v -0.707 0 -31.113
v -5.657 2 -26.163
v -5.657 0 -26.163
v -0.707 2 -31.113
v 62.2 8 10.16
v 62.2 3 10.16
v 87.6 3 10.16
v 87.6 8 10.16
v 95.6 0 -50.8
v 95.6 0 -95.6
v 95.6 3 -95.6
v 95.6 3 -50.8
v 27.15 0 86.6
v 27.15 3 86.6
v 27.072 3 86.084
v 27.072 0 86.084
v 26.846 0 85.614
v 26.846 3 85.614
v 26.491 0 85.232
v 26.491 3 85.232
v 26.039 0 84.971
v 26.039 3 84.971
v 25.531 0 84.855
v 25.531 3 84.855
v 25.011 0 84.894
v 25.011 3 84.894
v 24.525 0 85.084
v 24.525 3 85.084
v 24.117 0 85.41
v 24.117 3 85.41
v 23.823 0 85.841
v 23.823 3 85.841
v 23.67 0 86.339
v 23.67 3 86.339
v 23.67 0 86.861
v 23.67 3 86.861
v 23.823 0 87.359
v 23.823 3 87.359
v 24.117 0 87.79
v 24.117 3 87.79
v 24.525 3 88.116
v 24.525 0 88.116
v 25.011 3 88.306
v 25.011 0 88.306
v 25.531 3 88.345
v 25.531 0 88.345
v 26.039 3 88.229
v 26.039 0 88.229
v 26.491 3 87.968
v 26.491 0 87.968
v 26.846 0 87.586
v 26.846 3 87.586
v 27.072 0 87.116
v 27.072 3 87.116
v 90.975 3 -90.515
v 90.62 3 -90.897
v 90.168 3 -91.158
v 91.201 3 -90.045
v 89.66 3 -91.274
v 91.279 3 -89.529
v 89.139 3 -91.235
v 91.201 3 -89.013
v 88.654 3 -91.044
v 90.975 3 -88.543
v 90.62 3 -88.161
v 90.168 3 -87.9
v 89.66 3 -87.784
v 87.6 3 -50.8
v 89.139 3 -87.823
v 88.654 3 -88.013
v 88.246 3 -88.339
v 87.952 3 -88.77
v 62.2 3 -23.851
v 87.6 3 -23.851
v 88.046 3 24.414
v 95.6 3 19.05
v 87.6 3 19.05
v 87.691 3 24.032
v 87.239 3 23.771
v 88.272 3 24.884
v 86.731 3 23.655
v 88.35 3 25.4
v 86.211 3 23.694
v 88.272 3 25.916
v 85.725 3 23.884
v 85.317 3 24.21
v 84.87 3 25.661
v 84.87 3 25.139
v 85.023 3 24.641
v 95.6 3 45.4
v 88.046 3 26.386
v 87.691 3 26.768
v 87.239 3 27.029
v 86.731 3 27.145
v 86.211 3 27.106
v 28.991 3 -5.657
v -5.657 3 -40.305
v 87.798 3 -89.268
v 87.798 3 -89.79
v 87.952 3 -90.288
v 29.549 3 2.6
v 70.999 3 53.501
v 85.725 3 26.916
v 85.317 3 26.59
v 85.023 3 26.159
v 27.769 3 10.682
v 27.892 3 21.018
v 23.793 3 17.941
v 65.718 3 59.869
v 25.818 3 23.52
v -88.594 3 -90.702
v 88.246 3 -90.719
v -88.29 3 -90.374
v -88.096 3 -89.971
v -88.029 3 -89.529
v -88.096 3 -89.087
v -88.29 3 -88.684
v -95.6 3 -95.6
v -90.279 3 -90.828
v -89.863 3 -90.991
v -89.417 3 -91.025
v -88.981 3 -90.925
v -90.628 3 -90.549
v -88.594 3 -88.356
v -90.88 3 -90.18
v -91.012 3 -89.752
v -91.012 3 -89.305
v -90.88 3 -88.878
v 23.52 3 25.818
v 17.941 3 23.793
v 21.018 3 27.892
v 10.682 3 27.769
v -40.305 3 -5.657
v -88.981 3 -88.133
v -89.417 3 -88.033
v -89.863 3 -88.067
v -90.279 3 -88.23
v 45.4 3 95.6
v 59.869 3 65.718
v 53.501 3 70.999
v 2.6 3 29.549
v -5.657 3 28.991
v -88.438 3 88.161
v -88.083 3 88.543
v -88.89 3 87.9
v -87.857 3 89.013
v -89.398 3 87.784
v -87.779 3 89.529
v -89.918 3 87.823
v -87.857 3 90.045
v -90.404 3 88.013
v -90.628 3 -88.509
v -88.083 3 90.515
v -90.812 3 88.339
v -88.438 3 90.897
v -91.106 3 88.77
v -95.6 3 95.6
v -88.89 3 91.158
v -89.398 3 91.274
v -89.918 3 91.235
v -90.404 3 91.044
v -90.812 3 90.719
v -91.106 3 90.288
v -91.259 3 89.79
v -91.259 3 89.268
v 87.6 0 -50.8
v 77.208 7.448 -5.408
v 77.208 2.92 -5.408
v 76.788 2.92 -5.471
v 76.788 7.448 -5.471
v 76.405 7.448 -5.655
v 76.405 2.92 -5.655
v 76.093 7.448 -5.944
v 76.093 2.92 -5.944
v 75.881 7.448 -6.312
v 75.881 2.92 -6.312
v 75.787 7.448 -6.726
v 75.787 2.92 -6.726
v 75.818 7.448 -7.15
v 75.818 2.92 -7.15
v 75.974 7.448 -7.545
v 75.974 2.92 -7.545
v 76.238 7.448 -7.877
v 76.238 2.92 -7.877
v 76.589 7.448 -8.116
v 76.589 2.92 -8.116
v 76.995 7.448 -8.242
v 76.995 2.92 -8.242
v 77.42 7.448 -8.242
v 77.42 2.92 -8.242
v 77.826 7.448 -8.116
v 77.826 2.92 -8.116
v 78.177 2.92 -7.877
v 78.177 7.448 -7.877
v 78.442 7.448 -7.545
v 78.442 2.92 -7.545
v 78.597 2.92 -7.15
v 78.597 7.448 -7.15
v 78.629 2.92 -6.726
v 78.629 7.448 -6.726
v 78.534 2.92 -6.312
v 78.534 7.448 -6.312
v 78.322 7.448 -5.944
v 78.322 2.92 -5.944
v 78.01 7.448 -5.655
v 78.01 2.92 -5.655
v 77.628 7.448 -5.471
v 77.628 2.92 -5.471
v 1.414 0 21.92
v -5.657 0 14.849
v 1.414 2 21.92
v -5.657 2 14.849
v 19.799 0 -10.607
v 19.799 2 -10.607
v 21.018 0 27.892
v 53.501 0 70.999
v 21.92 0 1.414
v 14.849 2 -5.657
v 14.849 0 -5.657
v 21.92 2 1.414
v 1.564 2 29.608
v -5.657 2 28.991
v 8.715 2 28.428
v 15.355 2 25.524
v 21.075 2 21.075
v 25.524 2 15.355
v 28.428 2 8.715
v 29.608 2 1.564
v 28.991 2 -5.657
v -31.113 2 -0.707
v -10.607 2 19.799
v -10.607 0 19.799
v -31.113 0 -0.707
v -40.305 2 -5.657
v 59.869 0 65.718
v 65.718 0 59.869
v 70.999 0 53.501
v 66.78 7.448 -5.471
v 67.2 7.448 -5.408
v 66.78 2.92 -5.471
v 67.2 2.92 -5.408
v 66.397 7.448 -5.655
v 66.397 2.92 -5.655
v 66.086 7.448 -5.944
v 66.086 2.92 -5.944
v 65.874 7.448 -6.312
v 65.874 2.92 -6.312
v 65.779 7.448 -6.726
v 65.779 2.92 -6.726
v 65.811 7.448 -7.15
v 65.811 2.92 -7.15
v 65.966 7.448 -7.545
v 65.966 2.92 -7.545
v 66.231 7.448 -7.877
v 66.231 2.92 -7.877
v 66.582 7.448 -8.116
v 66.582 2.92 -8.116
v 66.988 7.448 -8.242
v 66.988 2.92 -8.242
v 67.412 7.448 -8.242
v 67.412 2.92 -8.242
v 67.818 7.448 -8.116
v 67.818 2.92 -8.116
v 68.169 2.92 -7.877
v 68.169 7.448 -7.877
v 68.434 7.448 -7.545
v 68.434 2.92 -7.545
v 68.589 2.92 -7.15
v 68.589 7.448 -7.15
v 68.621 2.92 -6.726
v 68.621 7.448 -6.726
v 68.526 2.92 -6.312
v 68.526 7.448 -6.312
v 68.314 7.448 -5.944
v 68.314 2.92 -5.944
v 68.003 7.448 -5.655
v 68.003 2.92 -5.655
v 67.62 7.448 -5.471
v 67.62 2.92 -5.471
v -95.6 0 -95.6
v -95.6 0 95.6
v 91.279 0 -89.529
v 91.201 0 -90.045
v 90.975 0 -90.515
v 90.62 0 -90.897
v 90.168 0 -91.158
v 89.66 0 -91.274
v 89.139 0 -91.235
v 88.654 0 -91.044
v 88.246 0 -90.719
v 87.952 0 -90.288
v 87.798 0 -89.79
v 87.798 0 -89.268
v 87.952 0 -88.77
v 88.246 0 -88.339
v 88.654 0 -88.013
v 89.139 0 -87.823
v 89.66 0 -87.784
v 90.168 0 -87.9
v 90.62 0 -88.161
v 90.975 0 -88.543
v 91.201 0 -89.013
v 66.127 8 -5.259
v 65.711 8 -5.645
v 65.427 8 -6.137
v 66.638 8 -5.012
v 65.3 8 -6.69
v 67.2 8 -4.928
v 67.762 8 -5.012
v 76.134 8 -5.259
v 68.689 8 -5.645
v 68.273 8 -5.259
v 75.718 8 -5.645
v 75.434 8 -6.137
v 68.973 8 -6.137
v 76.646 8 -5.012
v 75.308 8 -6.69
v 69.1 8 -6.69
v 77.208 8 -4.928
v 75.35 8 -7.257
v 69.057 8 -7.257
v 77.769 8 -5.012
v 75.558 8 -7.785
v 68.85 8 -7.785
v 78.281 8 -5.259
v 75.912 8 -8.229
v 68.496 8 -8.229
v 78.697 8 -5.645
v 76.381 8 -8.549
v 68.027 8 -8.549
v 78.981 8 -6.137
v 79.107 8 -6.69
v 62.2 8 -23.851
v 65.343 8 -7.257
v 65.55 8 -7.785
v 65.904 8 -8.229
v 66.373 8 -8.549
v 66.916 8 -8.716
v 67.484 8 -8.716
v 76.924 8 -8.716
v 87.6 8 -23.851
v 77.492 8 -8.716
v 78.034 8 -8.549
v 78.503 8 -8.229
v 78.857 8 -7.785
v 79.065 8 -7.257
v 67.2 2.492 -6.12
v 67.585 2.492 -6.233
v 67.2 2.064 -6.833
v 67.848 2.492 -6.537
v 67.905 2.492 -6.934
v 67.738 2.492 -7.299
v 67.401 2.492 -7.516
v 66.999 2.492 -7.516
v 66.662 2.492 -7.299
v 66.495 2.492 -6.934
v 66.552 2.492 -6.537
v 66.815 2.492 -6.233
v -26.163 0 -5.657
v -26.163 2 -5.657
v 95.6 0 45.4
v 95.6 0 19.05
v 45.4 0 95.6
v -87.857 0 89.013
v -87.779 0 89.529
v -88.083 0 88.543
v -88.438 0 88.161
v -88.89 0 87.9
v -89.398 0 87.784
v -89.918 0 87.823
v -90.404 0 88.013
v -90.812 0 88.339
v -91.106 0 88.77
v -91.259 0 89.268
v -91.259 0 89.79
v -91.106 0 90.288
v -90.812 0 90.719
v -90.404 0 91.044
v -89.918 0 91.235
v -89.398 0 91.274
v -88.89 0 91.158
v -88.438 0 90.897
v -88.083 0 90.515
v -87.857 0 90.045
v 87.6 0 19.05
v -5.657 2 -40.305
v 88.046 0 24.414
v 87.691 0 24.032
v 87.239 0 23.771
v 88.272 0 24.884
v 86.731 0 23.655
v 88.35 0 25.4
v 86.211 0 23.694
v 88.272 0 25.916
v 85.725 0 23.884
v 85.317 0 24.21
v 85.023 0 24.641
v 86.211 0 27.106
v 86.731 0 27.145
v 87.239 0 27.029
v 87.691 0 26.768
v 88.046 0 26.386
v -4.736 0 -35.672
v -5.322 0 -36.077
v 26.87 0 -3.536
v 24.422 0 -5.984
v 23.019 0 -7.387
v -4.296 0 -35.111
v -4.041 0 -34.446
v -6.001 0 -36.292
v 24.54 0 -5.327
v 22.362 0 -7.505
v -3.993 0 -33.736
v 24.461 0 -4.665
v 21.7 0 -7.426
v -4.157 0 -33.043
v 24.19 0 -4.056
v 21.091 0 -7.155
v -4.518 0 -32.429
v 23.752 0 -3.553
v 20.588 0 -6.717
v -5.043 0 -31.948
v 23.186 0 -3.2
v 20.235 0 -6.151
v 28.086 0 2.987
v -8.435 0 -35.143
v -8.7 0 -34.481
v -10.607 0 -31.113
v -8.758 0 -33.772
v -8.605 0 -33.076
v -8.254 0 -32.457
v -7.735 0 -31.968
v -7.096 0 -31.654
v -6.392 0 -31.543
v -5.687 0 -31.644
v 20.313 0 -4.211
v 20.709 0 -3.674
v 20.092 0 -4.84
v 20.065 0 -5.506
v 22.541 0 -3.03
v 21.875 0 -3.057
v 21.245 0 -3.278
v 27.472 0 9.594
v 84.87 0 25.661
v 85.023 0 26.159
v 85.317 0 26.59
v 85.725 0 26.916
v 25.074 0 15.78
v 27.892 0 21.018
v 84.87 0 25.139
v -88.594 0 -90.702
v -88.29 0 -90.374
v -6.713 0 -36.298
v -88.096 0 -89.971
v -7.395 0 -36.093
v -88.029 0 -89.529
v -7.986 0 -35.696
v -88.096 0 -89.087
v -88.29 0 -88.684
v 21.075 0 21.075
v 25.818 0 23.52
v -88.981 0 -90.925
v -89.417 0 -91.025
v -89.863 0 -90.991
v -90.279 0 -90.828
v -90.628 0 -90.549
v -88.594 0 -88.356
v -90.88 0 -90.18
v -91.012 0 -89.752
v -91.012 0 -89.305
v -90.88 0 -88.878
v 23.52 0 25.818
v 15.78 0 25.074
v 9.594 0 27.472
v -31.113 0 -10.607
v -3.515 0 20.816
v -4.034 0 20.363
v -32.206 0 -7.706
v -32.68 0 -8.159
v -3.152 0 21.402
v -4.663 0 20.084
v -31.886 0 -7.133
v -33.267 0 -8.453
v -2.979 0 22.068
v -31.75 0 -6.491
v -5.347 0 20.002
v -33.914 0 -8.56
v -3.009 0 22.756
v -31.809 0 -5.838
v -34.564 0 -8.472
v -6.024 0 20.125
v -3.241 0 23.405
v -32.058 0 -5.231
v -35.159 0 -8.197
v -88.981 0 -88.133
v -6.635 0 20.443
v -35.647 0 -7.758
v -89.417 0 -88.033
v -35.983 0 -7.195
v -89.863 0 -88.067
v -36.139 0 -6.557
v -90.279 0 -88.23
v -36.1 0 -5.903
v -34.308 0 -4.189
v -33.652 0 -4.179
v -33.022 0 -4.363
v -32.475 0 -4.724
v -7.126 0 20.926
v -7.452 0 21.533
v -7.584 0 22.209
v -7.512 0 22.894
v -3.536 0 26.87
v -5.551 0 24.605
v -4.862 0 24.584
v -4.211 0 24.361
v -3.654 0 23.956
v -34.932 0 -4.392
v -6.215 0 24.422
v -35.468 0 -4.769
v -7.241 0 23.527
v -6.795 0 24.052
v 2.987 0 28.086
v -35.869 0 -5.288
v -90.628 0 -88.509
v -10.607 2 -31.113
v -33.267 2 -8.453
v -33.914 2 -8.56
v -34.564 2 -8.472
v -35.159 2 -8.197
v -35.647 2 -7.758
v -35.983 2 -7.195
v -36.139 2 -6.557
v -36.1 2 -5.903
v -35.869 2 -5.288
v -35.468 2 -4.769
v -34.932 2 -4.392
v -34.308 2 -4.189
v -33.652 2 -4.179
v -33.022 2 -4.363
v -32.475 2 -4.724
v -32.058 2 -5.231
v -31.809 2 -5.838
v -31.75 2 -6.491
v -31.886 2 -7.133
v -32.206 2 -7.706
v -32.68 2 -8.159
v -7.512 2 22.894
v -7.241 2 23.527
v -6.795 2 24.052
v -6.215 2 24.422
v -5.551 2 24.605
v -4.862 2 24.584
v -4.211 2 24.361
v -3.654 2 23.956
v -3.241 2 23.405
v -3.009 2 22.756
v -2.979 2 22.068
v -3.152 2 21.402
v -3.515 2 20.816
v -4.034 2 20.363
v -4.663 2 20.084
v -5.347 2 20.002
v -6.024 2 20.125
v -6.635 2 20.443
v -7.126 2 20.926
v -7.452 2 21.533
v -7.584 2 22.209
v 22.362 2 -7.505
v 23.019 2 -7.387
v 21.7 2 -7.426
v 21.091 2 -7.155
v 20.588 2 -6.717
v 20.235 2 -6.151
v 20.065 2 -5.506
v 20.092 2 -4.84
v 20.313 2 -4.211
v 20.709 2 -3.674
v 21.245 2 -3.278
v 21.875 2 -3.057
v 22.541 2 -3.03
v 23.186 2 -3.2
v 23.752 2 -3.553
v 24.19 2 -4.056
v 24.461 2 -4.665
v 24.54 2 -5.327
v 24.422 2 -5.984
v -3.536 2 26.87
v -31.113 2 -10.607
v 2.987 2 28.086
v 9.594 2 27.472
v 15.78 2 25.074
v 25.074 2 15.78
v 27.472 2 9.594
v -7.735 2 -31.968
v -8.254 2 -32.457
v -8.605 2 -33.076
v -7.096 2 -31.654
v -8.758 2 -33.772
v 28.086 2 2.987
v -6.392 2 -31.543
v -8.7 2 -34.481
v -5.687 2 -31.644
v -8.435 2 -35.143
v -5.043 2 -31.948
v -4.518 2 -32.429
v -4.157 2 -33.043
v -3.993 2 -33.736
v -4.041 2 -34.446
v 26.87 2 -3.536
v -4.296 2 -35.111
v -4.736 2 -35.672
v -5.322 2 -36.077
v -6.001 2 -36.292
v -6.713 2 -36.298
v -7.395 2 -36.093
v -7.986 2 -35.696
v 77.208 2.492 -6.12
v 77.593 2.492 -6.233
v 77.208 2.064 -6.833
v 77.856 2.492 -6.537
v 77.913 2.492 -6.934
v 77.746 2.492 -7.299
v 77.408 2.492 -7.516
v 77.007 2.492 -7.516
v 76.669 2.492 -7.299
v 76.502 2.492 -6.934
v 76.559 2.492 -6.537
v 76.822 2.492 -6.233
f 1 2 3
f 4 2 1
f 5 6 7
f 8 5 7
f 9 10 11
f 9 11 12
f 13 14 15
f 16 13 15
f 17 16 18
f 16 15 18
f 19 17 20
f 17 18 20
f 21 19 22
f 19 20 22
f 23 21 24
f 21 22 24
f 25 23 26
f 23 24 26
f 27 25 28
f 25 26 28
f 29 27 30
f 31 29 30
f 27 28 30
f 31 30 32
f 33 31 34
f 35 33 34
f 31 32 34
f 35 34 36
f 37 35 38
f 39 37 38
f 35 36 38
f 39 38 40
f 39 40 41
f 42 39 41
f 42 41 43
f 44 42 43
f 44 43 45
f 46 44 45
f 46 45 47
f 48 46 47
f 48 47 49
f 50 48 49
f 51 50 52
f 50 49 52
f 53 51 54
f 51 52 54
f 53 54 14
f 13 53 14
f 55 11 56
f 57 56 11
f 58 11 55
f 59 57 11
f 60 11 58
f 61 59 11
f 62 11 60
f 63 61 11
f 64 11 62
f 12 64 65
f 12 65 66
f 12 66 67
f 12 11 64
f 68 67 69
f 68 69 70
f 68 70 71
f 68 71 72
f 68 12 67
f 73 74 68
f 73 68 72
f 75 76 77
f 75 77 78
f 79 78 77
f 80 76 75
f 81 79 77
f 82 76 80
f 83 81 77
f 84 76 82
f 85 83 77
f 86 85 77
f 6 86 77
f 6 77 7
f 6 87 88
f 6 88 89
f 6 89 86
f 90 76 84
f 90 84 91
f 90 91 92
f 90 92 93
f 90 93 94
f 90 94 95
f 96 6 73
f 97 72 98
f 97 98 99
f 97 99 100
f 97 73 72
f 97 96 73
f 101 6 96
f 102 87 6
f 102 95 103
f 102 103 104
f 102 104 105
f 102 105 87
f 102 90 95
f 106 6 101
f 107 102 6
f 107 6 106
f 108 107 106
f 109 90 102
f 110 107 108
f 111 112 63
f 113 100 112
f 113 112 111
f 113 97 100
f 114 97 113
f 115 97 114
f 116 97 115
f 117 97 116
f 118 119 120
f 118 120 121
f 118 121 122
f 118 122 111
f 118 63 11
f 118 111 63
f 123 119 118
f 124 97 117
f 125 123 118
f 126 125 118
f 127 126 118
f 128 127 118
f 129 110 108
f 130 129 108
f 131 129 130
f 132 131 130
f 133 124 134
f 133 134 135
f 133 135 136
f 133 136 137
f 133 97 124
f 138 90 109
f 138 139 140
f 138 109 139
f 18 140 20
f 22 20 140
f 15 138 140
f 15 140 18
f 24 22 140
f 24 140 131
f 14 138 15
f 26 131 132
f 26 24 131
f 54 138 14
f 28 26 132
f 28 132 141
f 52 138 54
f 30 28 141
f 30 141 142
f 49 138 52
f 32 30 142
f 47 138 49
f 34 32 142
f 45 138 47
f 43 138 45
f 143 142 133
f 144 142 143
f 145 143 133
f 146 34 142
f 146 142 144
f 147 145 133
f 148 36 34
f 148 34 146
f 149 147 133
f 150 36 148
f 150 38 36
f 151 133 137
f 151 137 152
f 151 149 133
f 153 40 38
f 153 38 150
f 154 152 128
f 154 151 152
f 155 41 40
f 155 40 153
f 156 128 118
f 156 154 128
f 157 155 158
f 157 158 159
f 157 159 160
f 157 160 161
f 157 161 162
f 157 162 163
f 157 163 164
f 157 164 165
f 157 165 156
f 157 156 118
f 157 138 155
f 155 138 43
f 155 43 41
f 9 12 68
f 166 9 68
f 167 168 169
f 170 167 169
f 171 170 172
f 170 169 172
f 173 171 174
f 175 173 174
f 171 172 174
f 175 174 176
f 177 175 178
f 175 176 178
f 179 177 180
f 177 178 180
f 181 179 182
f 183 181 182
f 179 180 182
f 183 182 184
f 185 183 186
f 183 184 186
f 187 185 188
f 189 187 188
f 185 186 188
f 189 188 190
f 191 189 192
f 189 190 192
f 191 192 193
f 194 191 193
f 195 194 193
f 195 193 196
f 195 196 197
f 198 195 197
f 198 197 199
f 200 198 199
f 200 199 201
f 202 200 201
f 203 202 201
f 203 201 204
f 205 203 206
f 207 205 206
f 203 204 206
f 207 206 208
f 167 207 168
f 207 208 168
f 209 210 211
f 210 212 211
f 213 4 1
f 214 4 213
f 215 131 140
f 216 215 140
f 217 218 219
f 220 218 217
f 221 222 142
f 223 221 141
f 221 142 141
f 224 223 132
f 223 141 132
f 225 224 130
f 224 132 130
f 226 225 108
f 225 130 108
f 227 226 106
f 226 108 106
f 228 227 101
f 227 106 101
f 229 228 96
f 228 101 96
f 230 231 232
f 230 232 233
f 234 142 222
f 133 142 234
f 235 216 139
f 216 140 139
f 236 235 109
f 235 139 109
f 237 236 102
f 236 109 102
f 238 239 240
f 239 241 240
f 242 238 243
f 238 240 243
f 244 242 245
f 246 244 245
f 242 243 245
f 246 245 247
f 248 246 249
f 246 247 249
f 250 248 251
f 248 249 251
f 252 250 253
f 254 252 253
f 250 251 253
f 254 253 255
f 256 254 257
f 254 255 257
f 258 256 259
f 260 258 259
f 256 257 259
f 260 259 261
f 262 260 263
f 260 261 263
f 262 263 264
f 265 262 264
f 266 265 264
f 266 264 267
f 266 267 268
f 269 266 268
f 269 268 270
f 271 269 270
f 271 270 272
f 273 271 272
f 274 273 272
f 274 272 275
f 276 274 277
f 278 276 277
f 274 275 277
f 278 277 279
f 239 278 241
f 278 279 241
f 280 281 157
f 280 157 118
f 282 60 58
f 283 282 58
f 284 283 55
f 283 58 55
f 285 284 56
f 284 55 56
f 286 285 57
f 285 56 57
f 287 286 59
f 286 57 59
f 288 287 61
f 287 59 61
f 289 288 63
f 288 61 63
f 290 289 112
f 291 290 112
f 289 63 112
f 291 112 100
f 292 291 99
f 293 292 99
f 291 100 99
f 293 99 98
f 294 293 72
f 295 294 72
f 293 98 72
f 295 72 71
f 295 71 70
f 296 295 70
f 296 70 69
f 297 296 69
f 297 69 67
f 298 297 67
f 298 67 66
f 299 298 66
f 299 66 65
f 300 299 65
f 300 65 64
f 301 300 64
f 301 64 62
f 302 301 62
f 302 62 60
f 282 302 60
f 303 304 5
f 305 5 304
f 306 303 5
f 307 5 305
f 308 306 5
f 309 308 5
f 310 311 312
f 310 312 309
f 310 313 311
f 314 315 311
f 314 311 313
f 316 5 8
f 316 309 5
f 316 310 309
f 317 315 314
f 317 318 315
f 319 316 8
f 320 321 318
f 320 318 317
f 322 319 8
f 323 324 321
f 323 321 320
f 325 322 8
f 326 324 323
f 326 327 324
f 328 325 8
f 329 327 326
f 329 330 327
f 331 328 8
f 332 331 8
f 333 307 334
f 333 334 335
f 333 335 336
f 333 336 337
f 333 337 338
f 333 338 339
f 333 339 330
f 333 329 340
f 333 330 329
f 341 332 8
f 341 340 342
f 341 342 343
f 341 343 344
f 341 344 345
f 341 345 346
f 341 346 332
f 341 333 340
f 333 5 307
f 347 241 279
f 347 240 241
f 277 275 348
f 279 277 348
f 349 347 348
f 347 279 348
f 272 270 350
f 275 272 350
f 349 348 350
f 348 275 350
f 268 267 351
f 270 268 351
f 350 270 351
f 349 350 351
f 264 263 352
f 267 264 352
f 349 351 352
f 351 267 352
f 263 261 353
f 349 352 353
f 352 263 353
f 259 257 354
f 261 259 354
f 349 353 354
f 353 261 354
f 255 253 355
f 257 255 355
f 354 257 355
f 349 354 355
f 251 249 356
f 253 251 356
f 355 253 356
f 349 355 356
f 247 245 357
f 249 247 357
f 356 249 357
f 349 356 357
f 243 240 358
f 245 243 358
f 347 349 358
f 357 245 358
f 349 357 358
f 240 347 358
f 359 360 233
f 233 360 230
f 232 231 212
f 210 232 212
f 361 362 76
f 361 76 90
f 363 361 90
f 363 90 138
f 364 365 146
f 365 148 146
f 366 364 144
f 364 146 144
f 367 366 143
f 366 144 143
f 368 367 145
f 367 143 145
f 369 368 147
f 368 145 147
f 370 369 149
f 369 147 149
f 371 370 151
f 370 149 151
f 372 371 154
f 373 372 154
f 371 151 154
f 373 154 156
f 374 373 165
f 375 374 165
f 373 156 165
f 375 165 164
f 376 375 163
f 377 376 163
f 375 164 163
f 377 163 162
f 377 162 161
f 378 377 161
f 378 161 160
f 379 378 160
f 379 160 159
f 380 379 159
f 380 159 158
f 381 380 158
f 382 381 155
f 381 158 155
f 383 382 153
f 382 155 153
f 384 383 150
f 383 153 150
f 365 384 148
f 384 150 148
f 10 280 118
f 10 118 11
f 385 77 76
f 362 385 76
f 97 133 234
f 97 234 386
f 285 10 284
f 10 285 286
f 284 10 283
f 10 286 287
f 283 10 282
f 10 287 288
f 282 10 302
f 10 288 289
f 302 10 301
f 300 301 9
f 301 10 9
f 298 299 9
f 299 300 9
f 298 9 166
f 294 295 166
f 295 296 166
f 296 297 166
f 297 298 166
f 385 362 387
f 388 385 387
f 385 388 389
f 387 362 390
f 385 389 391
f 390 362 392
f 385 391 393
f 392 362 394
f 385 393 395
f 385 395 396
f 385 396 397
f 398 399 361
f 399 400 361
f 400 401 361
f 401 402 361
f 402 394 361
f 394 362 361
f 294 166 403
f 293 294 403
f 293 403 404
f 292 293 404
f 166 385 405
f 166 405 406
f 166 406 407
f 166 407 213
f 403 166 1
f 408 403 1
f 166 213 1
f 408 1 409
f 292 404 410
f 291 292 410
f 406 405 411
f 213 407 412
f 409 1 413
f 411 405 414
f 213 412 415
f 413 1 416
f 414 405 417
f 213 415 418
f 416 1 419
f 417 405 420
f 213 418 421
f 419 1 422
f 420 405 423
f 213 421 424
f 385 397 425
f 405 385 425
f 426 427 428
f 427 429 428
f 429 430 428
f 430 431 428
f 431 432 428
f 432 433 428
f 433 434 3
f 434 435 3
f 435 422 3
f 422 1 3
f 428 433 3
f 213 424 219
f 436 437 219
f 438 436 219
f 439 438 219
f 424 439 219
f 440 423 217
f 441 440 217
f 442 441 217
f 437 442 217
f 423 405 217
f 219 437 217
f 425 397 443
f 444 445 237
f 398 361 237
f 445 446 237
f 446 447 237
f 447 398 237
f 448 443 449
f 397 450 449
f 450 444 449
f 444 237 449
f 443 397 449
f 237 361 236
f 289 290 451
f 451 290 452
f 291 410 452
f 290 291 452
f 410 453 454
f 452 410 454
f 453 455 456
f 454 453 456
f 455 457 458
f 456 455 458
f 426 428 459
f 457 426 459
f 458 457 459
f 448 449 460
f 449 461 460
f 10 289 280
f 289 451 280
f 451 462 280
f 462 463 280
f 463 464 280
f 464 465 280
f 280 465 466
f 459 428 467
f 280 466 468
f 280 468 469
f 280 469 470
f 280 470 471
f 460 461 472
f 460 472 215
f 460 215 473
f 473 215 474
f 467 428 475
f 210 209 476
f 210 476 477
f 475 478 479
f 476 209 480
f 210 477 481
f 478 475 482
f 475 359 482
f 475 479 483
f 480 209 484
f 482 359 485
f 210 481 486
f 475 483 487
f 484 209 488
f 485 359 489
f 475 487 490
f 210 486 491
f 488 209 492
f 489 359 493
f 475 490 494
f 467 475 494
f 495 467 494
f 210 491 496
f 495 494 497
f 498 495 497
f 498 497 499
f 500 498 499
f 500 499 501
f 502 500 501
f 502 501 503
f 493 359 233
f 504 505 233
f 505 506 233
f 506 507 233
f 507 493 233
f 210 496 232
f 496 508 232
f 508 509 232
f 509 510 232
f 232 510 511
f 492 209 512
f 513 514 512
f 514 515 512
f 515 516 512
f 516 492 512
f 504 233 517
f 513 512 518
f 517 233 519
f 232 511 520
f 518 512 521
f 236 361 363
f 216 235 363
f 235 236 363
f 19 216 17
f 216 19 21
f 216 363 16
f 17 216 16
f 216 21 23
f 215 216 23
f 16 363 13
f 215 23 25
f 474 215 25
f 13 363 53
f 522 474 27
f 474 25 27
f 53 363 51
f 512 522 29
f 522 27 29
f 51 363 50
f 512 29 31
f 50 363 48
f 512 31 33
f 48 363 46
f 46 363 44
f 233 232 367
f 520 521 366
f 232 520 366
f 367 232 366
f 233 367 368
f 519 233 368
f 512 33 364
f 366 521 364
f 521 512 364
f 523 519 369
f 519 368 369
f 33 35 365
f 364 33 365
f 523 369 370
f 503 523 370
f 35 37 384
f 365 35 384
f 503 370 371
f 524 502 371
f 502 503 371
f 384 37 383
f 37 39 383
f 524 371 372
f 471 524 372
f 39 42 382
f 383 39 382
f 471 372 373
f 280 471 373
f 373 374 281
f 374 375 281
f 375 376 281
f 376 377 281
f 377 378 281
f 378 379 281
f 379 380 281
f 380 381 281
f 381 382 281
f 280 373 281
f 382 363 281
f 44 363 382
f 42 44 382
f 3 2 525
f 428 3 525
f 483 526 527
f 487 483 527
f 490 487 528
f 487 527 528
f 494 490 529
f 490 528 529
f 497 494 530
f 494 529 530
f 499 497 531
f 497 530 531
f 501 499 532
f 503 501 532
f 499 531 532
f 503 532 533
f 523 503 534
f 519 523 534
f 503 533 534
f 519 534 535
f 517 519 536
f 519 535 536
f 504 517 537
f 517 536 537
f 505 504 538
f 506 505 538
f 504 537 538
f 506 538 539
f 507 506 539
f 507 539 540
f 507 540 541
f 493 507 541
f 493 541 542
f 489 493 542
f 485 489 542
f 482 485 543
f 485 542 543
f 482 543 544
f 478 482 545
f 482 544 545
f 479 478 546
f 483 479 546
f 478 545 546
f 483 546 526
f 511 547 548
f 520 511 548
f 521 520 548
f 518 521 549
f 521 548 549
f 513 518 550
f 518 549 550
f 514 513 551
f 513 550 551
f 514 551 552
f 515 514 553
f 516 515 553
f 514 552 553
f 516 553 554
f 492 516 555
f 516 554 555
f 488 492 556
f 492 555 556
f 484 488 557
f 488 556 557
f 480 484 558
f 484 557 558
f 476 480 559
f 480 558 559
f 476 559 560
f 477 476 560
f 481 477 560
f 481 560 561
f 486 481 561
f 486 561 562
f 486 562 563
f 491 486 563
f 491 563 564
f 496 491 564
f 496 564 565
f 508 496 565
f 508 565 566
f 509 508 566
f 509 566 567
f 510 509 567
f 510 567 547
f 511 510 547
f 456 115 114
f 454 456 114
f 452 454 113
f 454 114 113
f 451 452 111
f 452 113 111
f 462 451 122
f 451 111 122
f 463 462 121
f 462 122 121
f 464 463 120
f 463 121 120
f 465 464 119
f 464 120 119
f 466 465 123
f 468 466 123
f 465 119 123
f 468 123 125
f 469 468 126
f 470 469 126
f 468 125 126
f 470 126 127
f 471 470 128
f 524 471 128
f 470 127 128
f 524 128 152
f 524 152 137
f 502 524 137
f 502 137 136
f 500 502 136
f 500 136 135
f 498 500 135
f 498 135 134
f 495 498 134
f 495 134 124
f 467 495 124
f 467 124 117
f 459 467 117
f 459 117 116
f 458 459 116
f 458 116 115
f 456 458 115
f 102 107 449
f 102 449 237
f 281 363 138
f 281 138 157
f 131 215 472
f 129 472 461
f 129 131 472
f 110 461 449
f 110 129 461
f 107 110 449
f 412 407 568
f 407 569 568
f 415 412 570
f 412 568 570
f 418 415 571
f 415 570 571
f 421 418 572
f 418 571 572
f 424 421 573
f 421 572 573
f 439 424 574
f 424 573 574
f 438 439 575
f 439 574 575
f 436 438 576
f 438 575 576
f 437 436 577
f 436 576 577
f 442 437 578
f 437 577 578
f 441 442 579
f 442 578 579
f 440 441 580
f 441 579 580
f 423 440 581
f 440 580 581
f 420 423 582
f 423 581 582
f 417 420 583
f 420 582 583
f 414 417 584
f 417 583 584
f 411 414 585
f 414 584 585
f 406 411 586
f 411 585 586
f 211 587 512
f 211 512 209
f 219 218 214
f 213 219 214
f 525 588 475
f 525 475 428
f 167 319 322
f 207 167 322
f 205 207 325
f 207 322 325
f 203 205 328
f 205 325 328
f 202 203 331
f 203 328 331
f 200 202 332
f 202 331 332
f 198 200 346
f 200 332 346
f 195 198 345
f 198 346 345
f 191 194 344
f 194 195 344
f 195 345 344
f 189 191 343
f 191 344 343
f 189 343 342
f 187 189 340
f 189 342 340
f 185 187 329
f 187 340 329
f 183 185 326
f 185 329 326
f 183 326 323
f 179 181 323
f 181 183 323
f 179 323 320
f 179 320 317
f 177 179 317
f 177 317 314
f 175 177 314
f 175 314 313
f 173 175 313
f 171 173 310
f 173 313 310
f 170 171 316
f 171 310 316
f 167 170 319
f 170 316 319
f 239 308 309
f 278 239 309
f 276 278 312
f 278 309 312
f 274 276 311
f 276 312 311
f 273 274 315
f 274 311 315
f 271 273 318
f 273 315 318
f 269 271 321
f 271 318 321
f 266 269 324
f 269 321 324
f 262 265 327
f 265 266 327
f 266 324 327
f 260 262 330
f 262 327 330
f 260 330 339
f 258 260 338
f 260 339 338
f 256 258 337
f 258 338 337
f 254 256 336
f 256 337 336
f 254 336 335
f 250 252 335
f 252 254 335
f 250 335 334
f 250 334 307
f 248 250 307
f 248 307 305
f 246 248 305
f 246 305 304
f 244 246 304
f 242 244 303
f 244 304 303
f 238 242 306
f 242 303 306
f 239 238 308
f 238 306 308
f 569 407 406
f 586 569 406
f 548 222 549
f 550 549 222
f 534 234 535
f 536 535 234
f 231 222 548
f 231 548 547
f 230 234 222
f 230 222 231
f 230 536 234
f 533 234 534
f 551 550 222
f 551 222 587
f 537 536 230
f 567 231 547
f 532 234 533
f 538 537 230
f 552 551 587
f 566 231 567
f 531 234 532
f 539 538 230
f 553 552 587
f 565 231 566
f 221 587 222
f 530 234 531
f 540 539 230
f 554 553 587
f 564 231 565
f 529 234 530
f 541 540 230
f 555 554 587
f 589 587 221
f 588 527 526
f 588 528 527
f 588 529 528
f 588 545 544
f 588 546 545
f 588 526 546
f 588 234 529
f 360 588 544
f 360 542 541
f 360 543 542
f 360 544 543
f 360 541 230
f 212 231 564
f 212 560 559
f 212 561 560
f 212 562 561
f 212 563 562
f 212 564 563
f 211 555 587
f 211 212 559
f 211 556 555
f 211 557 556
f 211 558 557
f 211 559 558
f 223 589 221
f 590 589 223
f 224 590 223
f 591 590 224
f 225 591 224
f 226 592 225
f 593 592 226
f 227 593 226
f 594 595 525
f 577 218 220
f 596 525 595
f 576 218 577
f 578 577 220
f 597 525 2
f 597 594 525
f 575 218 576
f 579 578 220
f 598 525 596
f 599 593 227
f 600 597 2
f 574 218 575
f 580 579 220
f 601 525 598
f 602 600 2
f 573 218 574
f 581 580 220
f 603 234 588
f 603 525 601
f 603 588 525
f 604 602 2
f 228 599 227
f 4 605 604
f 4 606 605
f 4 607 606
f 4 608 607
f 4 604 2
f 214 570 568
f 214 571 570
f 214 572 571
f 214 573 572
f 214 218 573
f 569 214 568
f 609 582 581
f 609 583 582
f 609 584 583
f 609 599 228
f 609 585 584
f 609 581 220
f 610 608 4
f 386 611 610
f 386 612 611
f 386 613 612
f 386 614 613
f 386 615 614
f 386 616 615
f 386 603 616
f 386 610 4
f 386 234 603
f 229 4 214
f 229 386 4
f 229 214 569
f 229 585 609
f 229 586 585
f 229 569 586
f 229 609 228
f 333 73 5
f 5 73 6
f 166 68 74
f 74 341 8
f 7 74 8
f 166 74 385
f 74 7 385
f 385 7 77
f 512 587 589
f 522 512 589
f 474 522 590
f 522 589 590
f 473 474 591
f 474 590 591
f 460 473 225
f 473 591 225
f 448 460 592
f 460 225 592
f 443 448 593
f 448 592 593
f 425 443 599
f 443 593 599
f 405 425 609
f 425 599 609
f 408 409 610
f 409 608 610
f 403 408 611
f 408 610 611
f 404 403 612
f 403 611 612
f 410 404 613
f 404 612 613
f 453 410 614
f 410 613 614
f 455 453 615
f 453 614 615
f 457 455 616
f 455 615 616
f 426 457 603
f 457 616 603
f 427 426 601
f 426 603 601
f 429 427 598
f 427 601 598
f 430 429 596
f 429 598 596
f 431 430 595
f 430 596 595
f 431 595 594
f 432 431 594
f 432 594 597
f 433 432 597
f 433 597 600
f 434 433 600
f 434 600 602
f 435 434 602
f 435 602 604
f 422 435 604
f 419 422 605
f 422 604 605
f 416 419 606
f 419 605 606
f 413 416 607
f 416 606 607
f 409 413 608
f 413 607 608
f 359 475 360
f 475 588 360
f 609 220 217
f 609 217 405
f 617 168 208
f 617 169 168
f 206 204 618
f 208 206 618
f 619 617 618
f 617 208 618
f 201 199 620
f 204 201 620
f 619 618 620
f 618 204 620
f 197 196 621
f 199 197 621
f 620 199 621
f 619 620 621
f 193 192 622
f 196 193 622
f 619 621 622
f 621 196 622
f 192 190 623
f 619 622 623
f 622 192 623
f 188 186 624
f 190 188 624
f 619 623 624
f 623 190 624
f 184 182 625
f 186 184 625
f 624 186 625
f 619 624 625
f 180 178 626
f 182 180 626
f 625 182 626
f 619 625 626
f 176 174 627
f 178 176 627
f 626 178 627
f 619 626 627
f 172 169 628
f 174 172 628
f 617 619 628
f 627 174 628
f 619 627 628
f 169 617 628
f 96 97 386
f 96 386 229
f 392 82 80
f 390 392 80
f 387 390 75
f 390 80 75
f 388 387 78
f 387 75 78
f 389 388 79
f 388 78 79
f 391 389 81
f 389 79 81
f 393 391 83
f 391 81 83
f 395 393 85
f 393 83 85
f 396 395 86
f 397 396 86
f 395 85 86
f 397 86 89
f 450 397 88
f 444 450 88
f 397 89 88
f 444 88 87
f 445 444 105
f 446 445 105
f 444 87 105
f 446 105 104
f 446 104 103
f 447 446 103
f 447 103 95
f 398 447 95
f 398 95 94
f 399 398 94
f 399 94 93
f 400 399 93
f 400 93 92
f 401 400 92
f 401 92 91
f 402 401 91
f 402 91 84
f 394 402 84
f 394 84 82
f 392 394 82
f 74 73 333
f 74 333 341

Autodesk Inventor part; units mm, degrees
ref_plane "YZ Plane" through (0, 0, 0) normal (1, 0, 0) x (0, 1, 0)
ref_plane "XZ Plane" through (0, 0, 0) normal (0, 1, 0) x (-1, 0, 0)
sketch "Sketch1" plane through (0, 0, 0) normal (0, 1, 0) x (-1, 0, 0)
  line L0 (101.6, -101.6) -> (-101.6, -101.6)
  line L1 (-101.6, -101.6) -> (-101.6, 101.6)
  line L2 (-101.6, 101.6) -> (101.6, 101.6)
  line L3 (101.6, 101.6) -> (101.6, -101.6)
  line L4 (96.6, -96.6) -> (-96.6, -96.6)
  line L5 (-96.6, -96.6) -> (-96.6, 96.6)
  line L6 (-96.6, 96.6) -> (96.6, 96.6)
  line L7 (96.6, 96.6) -> (96.6, -96.6)
  line L8 (101.6, 101.6) -> (-40.4, 101.6)
  circle A0 centre (0, 0) radius 88.9
  line L9 (-40.4, 101.6) -> (-101.6, 40.4)
  line L10 (-45.4, 101.6) -> (-101.6, 45.4)
  line L11 (96.6, 96.6) -> (96.6, 101.6)
  line L12 (-45.4, 101.6) -> (-35.4, 101.6)
  line L13 (-35.4, 101.6) -> (-35.4, 96.6)
  line L14 (-35.4, 96.6) -> (-45.4, 96.6)
  line L15 (-45.4, 96.6) -> (-45.4, 101.6)
  line L16 (-101.6, 39.4) -> (-39.4, 101.6)
  line L17 (95.6, -95.6) -> (-95.6, -95.6)
  line L18 (-95.6, -95.6) -> (-95.6, 95.6)
  line L19 (-95.6, 95.6) -> (95.6, 95.6)
  line L20 (95.6, 95.6) -> (95.6, -95.6)
  point P0 (96.6, 51.2168)
  point P1 (101.6, 40.4)
  point P2 (101.6, -40.4)
  point P3 (96.6, -51.2168)
  point P4 (-96.6, 45.4)
  point P5 (-45.4, 96.6)
  point P6 (-45.4, 95.6)
  point P7 (-95.6, 45.4)
  dimension "d0" = 203.2
  dimension "d1" = 203.2
  dimension "d2" = 101.6
  dimension "d3" = 101.6
  dimension "d4" = 5
  dimension "d5" = 5
  dimension "d6" = 5
  dimension "d7" = 5
  dimension "d8" = 142
  dimension "d9" = 61.2
  dimension "d10" = 177.8
  dimension "d11" = 5
  dimension "d12" = 5
  dimension "d13" = 10
  dimension "d14" = 1
  dimension "d15" = 1
  dimension "d16" = 1
  dimension "d17" = 1
  dimension "d18" = 1
extrude "Extrusion1" add sketch "Sketch1" along normal blind 3 contours L16 L19 L20 L17 L18 | A0
sketch "Sketch2" plane through (0, 3, 0) normal (0, 1, 0) x (1, 0, 0)
  circle A0 centre (0, 0) radius 34.925
  circle A1 centre (0, 0) radius 88.9
  line L0 (0, 0) -> (53.5014, -70.9987)
  line L1 (0, 0) -> (70.9987, -53.5014)
  line L2 (45.4, -95.6) -> (95.6, -45.4) projected
  line L3 (70.5, -70.5) -> (0, 0)
  point P0 (21.0184, -27.8923)
  point P1 (27.8923, -21.0184)
  dimension "d21" = 69.85
  dimension "d22" = 177.8
  dimension "d23" = 8
  dimension "d24" = 8
extrude "Extrusion2" cut sketch "Sketch2" against normal blind 5 contours A0 L3 A1 L0 | L1 A1 L3 A0
sketch "Sketch3" plane through (0, 3, 0) normal (0, 1, 0) x (1, 0, 0)
  circle A0 centre (0, 0) radius 2.5
  line L0 (11.3314, 2.139) -> (-2.139, -11.3314)
  line L1 (0, 0) -> (-5.6569, 5.6569)
  line L2 (-5.6569, -14.8492) -> (-26.163, 5.6569)
  line L3 (-5.6569, 26.163) -> (14.8492, 5.6569)
  circle A1 centre (-5.6569, 5.6569) radius 14
  line L4 (-26.163, 5.6569) -> (-5.6569, 26.163)
  line L5 (14.8492, 5.6569) -> (-5.6569, -14.8492)
  line L6 (-40.3051, 5.6569) -> (-5.6569, 40.3051)
  line L7 (-5.6569, 40.3051) -> (28.9914, 5.6569)
  line L8 (28.9914, 5.6569) -> (-5.6569, -28.9914)
  line L9 (-5.6569, -28.9914) -> (-40.3051, 5.6569)
  line L10 (-22.6451, 9.1747) -> (-9.1747, 22.6451)
  line L11 (-9.1747, 22.6451) -> (-12.7668, 26.2372)
  line L12 (-12.7668, 26.2372) -> (-26.2372, 12.7668)
  line L13 (-26.2372, 12.7668) -> (-22.6451, 9.1747)
  line L14 (-36.0624, 5.6569) -> (-5.6569, 36.0624)
  line L15 (-5.6569, 36.0624) -> (26.8701, 3.5355)
  line L16 (26.8701, 3.5355) -> (-3.5355, -26.8701)
  line L17 (-3.5355, -26.8701) -> (-36.0624, 5.6569)
  arc A2 (-5.6569, -28.9914) -> (28.9914, 5.6569) centre (0.4206, -0.4206) ccw
  dimension "d27" = 8
  dimension "d28" = 28
  dimension "d29" = 29
  dimension "d30" = 29
  dimension "d31" = 14.5
  dimension "d32" = 10
  dimension "d33" = 10
  dimension "d34" = 10
  dimension "d35" = 10
  dimension "d36" = 5.08
  dimension "d37" = 9.525
  dimension "d38" = 9.525
  dimension "d39" = 3
  dimension "d40" = 3
  dimension "d41" = 0
  dimension "d42" = 3
  dimension "d51" = 29.21
extrude "Extrusion3" cut sketch "Sketch3" against normal blind 1 contours A0 | L0 L5 L2 L4 L3 | L4 L13 L12 L11 | A1 | L6 L7 L8 L15 L14 L17 L9 | L8 A2 | L17 L14 L15 L8
sketch "Sketch4" plane through (0, 2, 0) normal (0, 1, 0) x (1, 0, 0)
  line L0 (-36.0624, 5.6569) -> (-5.6569, 36.0624)
  line L1 (-5.6569, 36.0624) -> (26.8701, 3.5355)
  line L2 (26.8701, 3.5355) -> (-3.5355, -26.8701)
  line L3 (-3.5355, -26.8701) -> (-36.0624, 5.6569)
  line L4 (-5.6569, 40.3051) -> (28.9914, 5.6569) projected
  line L5 (-40.3051, 5.6569) -> (-5.6569, 40.3051) projected
  line L6 (-5.6569, -28.9914) -> (-40.3051, 5.6569) projected
  line L7 (28.9914, 5.6569) -> (-5.6569, -28.9914) projected
  arc A0 (-3.5355, -26.8701) -> (26.8701, 3.5355) centre (4.0877, -4.0877) ccw
  point P0 (0, 0)
  dimension "d45" = 3
  dimension "d46" = 3
  dimension "d47" = 3
  dimension "d48" = 0
extrude "Extrusion4" cut sketch "Sketch4" against normal blind 5 contours L0 L1 L2 L3 | L2 A0
sketch "Sketch6" plane through (0, 3, 0) normal (0, 1, 0) x (1, 0, 0)
  line L0 (95.6, 95.6) -> (-95.6, 95.6) projected
  line L1 (95.6, 95.6) -> (87.6, 95.6)
  line L2 (87.6, 95.6) -> (87.6, -46.4)
  line L3 (87.6, -46.4) -> (95.6, -46.4)
  line L4 (95.6, -46.4) -> (95.6, 95.6)
  line L5 (95.6, -45.4) -> (95.6, 95.6) projected
  line L6 (87.6, -19.05) -> (95.6, -19.05)
  line L7 (95.6, -19.05) -> (95.6, 50.8)
  line L8 (95.6, 50.8) -> (87.6, 50.8)
  line L9 (87.6, 50.8) -> (87.6, -19.05)
  line L10 (0, 0) -> (95.6, 0)
  point P0 (95.6, -19.05)
  dimension "d58" = 8
  dimension "d59" = 142
  dimension "d62" = 50.8
  dimension "d63" = 19.05
extrude "Extrusion6" cut sketch "Sketch6" against normal blind 25.4 contours L4 L10 L2 L8 | L4 L6 L2 L10
sketch "Sketch7" plane through (0, 3, 0) normal (0, 1, 0) x (1, 0, 0)
  line L0 (-95.6, 95.6) -> (-95.6, -95.6) projected
  line L1 (-95.6, -95.6) -> (45.4, -95.6) projected
  line L2 (95.6, 50.8) -> (87.6, 50.8) projected
  line L3 (87.6, 50.8) -> (62.2, 50.8)
  line L4 (87.6, -19.05) -> (87.6, 50.8)
  line L5 (87.6, -19.05) -> (87.6, 50.8) projected
  line L6 (87.6, 50.8) -> (95.6, 50.8) projected
  line L7 (87.6, 50.8) -> (62.2, 50.8)
  line L8 (62.2, 50.8) -> (62.2, -10.16)
  line L9 (62.2, -10.16) -> (87.6, -10.16)
  line L10 (87.6, -10.16) -> (87.6, 50.8)
  line L11 (62.2, 23.8506) -> (87.6, 23.8506)
  point P0 (0, 0)
  dimension "d72" = 60.96
  dimension "d90" = 34.0106
extrude "Extrusion7" add sketch "Sketch7" along normal blind 5 contours L4 L9 L8 L11
sketch "Sketch8" plane through (0, 8, 0) normal (0, 1, 0) x (1, 0, 0)
  line L0 (62.2, -10.16) -> (87.6, -10.16) projected
  line L1 (62.2, -10.16) -> (87.6, -10.16)
  line L2 (87.6, -10.16) -> (87.6, 6.8326)
  line L3 (87.6, 50.8) -> (87.6, -19.05) projected
  line L4 (87.6, 6.8326) -> (62.2, 6.8326)
  circle A0 centre (77.2076, 6.8326) radius 1.5
  circle A1 centre (67.2, 6.8326) radius 1.5
  line L5 (62.2, 23.8506) -> (62.2, -10.16) projected
  point P0 (0, 0)
  dimension "d78" = 16.9926
  dimension "d79" = 3
  dimension "d80" = 3
  dimension "d139" = 5
  dimension "d140" = 10.0076
hole "Hole1" at (77.2076, 8, -6.8326) at (67.2, 8, -6.8326) direction (0, -1, 0) diameter 2.85 depth 5.08 tip angle 118 countersink diameter 3.81 countersink angle 82 thread size "M3.5x0.6" class "6H" standard "ANSI Metric M Profile"
sketch "Sketch9" plane through (0, 2, 0) normal (0, 1, 0) x (1, 0, 0)
  point P0 (0, 0)
sketch "Sketch10" plane through (0, 2, 0) normal (0, 1, 0) x (1, 0, 0)
  circle A0 centre (6.7129, 18.0166) radius 2
  circle A1 centre (-18.0312, -6.7275) radius 2
  circle A2 centre (-18.0312, -6.7275) radius 2
  circle A3 centre (-5.6569, 5.6469) radius 14
  circle A4 centre (0, -0.01) radius 2.5
  circle A5 centre (22.2964, 5.2615) radius 2.2448
  circle A6 centre (-5.2761, -22.3111) radius 2.3104
  circle A7 centre (-33.9469, 6.3598) radius 2.2008
  circle A8 centre (-6.3744, 33.9323) radius 2.3894
  line L0 (-5.6569, 40.3051) -> (28.9914, 5.6569) projected
  line L1 (-5.6569, 40.3051) -> (1.4142, 33.234)
  line L2 (-5.6569, 26.163) -> (1.4142, 33.234)
  line L3 (-5.6569, 26.163) -> (-12.7279, 33.234)
  line L4 (-40.3051, 5.6569) -> (-5.6569, 40.3051) projected
  line L5 (-5.6569, 40.3051) -> (-40.3051, 5.6569)
  line L6 (-5.6569, 26.163) -> (-33.234, -1.4142)
  line L7 (-5.6569, -28.9914) -> (-40.3051, 5.6569) projected
  line L8 (-33.234, 12.7279) -> (-26.163, 5.6569)
  arc A9 (-5.6569, -28.9914) -> (21.0752, -21.0752) centre (0.4206, -0.4206) ccw projected
  line L9 (-5.6569, -28.9914) -> (28.9914, 5.6569)
  line L10 (-5.6569, 36.0624) -> (26.8701, 3.5355) projected
  line L11 (-12.7279, -21.9203) -> (21.9203, 12.7279)
  line L12 (-5.6569, -14.8492) -> (1.4142, -21.9203)
  line L13 (14.8492, 5.6569) -> (21.9203, -1.4142)
  point P0 (0, 0)
  point P1 (0.0071, -0.017)
  point P2 (24.4219, 5.9837)
  point P3 (23.0187, 7.3869)
  point P4 (19.799, 10.6066)
  dimension "d91" = 34.9934
  dimension "d92" = 28
  dimension "d93" = 8
  dimension "d94" = 10
  dimension "d95" = 10
  dimension "d96" = 10
  dimension "d97" = 10
  dimension "d98" = 10
extrude "Extrusion8" add sketch "Sketch10" against normal up to surface (2 mm away) contours A5 L10 L9 L13 L11 | L2 L3 L4 L0 | L9 L7 L11 L12 | L6 L7 L4 L8
sketch "Sketch11" plane through (0, 3, 0) normal (0, 1, 0) x (1, 0, 0)
  circle A0 centre (6.7129, 18.0166) radius 2
  circle A1 centre (-18.0312, -6.7275) radius 2
  circle A2 centre (-18.0312, -6.7275) radius 2
  circle A3 centre (-5.6569, 5.6469) radius 14
  circle A4 centre (0, -0.01) radius 2.5
  circle A5 centre (22.2964, 5.2615) radius 2.2448
  circle A6 centre (-5.2761, -22.3111) radius 2.3104
  circle A7 centre (-33.9469, 6.3598) radius 2.2008
  circle A8 centre (-6.3744, 33.9323) radius 2.3894
  line L0 (-5.6569, 40.3051) -> (28.9914, 5.6569)
  line L1 (-5.6569, 40.3051) -> (1.4142, 33.234)
  line L2 (-5.6569, 26.163) -> (1.4142, 33.234)
  line L3 (-5.6569, 26.163) -> (-12.7279, 33.234)
  line L4 (-40.3051, 5.6569) -> (-5.6569, 40.3051)
  line L5 (-5.6569, 40.3051) -> (-40.3051, 5.6569)
  line L6 (-5.6569, 26.163) -> (-33.234, -1.4142)
  line L7 (-5.6569, -28.9914) -> (-40.3051, 5.6569)
  line L8 (-33.234, 12.7279) -> (-26.163, 5.6569)
  arc A9 (-5.6569, -28.9914) -> (21.0752, -21.0752) centre (0.4206, -0.4206) ccw
  line L9 (-5.6569, -28.9914) -> (28.9914, 5.6569)
  line L10 (-5.6569, 36.0624) -> (26.8701, 3.5355)
  line L11 (-12.7279, -21.9203) -> (21.9203, 12.7279)
  line L12 (-5.6569, -14.8492) -> (1.4142, -21.9203)
  line L13 (14.8492, 5.6569) -> (21.9203, -1.4142)
  point P0 (0, 0)
  point P1 (0, 0)
  point P2 (0.0071, -0.017)
  point P3 (24.4219, 5.9837)
  point P4 (23.0187, 7.3869)
  point P5 (19.799, 10.6066)
  point P6 (24.4219, 5.9837)
  point P7 (23.0187, 7.3869)
  dimension "d101" = 34.9934
  dimension "d102" = 28
  dimension "d103" = 8
  dimension "d104" = 10
  dimension "d105" = 10
  dimension "d106" = 10
  dimension "d107" = 10
  dimension "d108" = 10
extrude "Extrusion9" cut sketch "Sketch11" against normal blind 10 contours A5 L10 | A6 | A7 | A8 picked at (21.4653, 4.9881)
sketch "Sketch12" plane through (0, 3, 0) normal (0, 1, 0) x (1, 0, 0)
  line L0 (95.6, 50.8) -> (95.6, 95.6) projected
  line L1 (-95.6, -95.6) -> (45.4, -95.6) projected
  line L2 (95.6, 95.6) -> (-95.6, -95.6)
  line L3 (95.6, 95.6) -> (-95.6, 95.6) projected
  line L4 (0, 95.6) -> (0, -95.6)
  line L5 (-95.6, -95.6) -> (45.4, -95.6) projected
  point P0 (0, 0)
ref_plane "Work Plane2" through (0, 3, -95.6) normal (-1, 0, 0) x (0, 0, 1)
sketch "Sketch15" plane through (0, 3, 0) normal (0, 1, 0) x (1, 0, 0)
  line L0 (-96.6, 96.6) -> (-96.6, -96.6)
  line L1 (96.6, 96.6) -> (-96.6, 96.6)
  line L2 (-96.6, 96.6) -> (96.6, 96.6)
  line L3 (96.6, -45.4) -> (45.4, -96.6)
  line L4 (96.6, 96.6) -> (96.6, -45.4)
  line L5 (96.6, -45.4) -> (45.4, -96.6)
  line L6 (45.4, -96.6) -> (-96.6, -96.6)
  line L7 (-96.6, -96.6) -> (-96.6, 96.6)
  line L8 (-96.6, 96.6) -> (-89.5289, 89.5289)
  circle A0 centre (-89.5289, 89.5289) radius 5
  circle A1 centre (-89.5289, 89.5289) radius 1.5
  line L9 (-89.5289, 84.5289) -> (-96.6, 84.5289)
  line L10 (-89.5289, 89.5289) -> (-89.5289, 84.5289)
  line L11 (-89.5289, 89.5289) -> (-84.5289, 89.5289)
  line L12 (-84.5289, 96.6) -> (-84.5289, 89.5289)
  line L13 (-96.6, -96.6) -> (-89.5289, -89.5289)
  line L14 (-96.6, -96.6) -> (-86.6, -96.6) construction
  circle A2 centre (-89.5289, -89.5289) radius 5
  circle A3 centre (-89.5289, -89.5289) radius 1.75
  line L15 (-89.5289, -89.5289) -> (-84.5289, -89.5289)
  line L16 (-84.5289, -96.6) -> (-84.5289, -89.5289)
  line L17 (-89.5289, -89.5289) -> (-89.5289, -84.5289)
  line L18 (-96.6, -84.5289) -> (-89.5289, -84.5289)
  line L19 (96.6, 96.6) -> (89.5289, 89.5289)
  circle A4 centre (89.5289, 89.5289) radius 5
  circle A5 centre (89.5289, 89.5289) radius 1.75
  line L20 (89.5289, 89.5289) -> (84.5289, 89.5289)
  line L21 (84.5289, 96.6) -> (84.5289, 89.5289)
  line L22 (89.5289, 89.5289) -> (89.5289, 84.5289)
  line L23 (96.6, 84.5289) -> (89.5289, 84.5289)
  line L24 (96.6, -43.114) -> (96.6, 96.6)
  line L25 (-96.6, -96.6) -> (43.1178, -96.6)
  line L26 (28.9914, 5.6569) -> (-5.6569, -28.9914)
  line L27 (25.4, -25.4) -> (101.6, -25.4)
  line L28 (101.6, -88.9) -> (101.6, 101.6)
  line L29 (25.4, -25.4) -> (25.4, -101.6)
  line L30 (43.1178, -101.6) -> (-101.6, -101.6)
  line L31 (96.6, -25.4) -> (86.6, -25.4)
  circle A6 centre (86.6, -25.4) radius 5
  circle A7 centre (86.6, -25.4) radius 1.75
  line L32 (25.4, -96.6) -> (25.4, -86.6)
  circle A8 centre (25.4, -86.6) radius 5
  circle A9 centre (25.4, -86.6) radius 1.75
  point P0 (0, 0)
  point P1 (0, 0)
  dimension "d117" = 10
  dimension "d118" = 3
  dimension "d119" = 10
  dimension "d120" = 45
  dimension "d121" = 10
  dimension "d122" = 3.5
  dimension "d123" = 10
  dimension "d124" = 10
  dimension "d125" = 3.5
  dimension "d126" = 76.2
  dimension "d127" = 76.2
  dimension "d128" = 10
  dimension "d129" = 10
  dimension "d130" = 3.5
  dimension "d131" = 10
  dimension "d132" = 10
  dimension "d133" = 3.5
extrude "Extrusion12" cut sketch "Sketch15" against normal blind 25.4 contours A1 L11 L8 | L8 L10 A1 | L10 L11 A1 | L17 L13 A3 | A3 L15 L17 | L20 L22 A5 | A5 L19 L20 | L13 L15 A3 | A5 L22 L19 | A9 L29 | L29 A9 | A7 L27 | L27 A7
equation "\"d1\" = d0"
equation "\"d2\" = 0.5 * d0"
equation "\"d3\" = 0.5 * d0"
properties part number "Drop_Plate"
